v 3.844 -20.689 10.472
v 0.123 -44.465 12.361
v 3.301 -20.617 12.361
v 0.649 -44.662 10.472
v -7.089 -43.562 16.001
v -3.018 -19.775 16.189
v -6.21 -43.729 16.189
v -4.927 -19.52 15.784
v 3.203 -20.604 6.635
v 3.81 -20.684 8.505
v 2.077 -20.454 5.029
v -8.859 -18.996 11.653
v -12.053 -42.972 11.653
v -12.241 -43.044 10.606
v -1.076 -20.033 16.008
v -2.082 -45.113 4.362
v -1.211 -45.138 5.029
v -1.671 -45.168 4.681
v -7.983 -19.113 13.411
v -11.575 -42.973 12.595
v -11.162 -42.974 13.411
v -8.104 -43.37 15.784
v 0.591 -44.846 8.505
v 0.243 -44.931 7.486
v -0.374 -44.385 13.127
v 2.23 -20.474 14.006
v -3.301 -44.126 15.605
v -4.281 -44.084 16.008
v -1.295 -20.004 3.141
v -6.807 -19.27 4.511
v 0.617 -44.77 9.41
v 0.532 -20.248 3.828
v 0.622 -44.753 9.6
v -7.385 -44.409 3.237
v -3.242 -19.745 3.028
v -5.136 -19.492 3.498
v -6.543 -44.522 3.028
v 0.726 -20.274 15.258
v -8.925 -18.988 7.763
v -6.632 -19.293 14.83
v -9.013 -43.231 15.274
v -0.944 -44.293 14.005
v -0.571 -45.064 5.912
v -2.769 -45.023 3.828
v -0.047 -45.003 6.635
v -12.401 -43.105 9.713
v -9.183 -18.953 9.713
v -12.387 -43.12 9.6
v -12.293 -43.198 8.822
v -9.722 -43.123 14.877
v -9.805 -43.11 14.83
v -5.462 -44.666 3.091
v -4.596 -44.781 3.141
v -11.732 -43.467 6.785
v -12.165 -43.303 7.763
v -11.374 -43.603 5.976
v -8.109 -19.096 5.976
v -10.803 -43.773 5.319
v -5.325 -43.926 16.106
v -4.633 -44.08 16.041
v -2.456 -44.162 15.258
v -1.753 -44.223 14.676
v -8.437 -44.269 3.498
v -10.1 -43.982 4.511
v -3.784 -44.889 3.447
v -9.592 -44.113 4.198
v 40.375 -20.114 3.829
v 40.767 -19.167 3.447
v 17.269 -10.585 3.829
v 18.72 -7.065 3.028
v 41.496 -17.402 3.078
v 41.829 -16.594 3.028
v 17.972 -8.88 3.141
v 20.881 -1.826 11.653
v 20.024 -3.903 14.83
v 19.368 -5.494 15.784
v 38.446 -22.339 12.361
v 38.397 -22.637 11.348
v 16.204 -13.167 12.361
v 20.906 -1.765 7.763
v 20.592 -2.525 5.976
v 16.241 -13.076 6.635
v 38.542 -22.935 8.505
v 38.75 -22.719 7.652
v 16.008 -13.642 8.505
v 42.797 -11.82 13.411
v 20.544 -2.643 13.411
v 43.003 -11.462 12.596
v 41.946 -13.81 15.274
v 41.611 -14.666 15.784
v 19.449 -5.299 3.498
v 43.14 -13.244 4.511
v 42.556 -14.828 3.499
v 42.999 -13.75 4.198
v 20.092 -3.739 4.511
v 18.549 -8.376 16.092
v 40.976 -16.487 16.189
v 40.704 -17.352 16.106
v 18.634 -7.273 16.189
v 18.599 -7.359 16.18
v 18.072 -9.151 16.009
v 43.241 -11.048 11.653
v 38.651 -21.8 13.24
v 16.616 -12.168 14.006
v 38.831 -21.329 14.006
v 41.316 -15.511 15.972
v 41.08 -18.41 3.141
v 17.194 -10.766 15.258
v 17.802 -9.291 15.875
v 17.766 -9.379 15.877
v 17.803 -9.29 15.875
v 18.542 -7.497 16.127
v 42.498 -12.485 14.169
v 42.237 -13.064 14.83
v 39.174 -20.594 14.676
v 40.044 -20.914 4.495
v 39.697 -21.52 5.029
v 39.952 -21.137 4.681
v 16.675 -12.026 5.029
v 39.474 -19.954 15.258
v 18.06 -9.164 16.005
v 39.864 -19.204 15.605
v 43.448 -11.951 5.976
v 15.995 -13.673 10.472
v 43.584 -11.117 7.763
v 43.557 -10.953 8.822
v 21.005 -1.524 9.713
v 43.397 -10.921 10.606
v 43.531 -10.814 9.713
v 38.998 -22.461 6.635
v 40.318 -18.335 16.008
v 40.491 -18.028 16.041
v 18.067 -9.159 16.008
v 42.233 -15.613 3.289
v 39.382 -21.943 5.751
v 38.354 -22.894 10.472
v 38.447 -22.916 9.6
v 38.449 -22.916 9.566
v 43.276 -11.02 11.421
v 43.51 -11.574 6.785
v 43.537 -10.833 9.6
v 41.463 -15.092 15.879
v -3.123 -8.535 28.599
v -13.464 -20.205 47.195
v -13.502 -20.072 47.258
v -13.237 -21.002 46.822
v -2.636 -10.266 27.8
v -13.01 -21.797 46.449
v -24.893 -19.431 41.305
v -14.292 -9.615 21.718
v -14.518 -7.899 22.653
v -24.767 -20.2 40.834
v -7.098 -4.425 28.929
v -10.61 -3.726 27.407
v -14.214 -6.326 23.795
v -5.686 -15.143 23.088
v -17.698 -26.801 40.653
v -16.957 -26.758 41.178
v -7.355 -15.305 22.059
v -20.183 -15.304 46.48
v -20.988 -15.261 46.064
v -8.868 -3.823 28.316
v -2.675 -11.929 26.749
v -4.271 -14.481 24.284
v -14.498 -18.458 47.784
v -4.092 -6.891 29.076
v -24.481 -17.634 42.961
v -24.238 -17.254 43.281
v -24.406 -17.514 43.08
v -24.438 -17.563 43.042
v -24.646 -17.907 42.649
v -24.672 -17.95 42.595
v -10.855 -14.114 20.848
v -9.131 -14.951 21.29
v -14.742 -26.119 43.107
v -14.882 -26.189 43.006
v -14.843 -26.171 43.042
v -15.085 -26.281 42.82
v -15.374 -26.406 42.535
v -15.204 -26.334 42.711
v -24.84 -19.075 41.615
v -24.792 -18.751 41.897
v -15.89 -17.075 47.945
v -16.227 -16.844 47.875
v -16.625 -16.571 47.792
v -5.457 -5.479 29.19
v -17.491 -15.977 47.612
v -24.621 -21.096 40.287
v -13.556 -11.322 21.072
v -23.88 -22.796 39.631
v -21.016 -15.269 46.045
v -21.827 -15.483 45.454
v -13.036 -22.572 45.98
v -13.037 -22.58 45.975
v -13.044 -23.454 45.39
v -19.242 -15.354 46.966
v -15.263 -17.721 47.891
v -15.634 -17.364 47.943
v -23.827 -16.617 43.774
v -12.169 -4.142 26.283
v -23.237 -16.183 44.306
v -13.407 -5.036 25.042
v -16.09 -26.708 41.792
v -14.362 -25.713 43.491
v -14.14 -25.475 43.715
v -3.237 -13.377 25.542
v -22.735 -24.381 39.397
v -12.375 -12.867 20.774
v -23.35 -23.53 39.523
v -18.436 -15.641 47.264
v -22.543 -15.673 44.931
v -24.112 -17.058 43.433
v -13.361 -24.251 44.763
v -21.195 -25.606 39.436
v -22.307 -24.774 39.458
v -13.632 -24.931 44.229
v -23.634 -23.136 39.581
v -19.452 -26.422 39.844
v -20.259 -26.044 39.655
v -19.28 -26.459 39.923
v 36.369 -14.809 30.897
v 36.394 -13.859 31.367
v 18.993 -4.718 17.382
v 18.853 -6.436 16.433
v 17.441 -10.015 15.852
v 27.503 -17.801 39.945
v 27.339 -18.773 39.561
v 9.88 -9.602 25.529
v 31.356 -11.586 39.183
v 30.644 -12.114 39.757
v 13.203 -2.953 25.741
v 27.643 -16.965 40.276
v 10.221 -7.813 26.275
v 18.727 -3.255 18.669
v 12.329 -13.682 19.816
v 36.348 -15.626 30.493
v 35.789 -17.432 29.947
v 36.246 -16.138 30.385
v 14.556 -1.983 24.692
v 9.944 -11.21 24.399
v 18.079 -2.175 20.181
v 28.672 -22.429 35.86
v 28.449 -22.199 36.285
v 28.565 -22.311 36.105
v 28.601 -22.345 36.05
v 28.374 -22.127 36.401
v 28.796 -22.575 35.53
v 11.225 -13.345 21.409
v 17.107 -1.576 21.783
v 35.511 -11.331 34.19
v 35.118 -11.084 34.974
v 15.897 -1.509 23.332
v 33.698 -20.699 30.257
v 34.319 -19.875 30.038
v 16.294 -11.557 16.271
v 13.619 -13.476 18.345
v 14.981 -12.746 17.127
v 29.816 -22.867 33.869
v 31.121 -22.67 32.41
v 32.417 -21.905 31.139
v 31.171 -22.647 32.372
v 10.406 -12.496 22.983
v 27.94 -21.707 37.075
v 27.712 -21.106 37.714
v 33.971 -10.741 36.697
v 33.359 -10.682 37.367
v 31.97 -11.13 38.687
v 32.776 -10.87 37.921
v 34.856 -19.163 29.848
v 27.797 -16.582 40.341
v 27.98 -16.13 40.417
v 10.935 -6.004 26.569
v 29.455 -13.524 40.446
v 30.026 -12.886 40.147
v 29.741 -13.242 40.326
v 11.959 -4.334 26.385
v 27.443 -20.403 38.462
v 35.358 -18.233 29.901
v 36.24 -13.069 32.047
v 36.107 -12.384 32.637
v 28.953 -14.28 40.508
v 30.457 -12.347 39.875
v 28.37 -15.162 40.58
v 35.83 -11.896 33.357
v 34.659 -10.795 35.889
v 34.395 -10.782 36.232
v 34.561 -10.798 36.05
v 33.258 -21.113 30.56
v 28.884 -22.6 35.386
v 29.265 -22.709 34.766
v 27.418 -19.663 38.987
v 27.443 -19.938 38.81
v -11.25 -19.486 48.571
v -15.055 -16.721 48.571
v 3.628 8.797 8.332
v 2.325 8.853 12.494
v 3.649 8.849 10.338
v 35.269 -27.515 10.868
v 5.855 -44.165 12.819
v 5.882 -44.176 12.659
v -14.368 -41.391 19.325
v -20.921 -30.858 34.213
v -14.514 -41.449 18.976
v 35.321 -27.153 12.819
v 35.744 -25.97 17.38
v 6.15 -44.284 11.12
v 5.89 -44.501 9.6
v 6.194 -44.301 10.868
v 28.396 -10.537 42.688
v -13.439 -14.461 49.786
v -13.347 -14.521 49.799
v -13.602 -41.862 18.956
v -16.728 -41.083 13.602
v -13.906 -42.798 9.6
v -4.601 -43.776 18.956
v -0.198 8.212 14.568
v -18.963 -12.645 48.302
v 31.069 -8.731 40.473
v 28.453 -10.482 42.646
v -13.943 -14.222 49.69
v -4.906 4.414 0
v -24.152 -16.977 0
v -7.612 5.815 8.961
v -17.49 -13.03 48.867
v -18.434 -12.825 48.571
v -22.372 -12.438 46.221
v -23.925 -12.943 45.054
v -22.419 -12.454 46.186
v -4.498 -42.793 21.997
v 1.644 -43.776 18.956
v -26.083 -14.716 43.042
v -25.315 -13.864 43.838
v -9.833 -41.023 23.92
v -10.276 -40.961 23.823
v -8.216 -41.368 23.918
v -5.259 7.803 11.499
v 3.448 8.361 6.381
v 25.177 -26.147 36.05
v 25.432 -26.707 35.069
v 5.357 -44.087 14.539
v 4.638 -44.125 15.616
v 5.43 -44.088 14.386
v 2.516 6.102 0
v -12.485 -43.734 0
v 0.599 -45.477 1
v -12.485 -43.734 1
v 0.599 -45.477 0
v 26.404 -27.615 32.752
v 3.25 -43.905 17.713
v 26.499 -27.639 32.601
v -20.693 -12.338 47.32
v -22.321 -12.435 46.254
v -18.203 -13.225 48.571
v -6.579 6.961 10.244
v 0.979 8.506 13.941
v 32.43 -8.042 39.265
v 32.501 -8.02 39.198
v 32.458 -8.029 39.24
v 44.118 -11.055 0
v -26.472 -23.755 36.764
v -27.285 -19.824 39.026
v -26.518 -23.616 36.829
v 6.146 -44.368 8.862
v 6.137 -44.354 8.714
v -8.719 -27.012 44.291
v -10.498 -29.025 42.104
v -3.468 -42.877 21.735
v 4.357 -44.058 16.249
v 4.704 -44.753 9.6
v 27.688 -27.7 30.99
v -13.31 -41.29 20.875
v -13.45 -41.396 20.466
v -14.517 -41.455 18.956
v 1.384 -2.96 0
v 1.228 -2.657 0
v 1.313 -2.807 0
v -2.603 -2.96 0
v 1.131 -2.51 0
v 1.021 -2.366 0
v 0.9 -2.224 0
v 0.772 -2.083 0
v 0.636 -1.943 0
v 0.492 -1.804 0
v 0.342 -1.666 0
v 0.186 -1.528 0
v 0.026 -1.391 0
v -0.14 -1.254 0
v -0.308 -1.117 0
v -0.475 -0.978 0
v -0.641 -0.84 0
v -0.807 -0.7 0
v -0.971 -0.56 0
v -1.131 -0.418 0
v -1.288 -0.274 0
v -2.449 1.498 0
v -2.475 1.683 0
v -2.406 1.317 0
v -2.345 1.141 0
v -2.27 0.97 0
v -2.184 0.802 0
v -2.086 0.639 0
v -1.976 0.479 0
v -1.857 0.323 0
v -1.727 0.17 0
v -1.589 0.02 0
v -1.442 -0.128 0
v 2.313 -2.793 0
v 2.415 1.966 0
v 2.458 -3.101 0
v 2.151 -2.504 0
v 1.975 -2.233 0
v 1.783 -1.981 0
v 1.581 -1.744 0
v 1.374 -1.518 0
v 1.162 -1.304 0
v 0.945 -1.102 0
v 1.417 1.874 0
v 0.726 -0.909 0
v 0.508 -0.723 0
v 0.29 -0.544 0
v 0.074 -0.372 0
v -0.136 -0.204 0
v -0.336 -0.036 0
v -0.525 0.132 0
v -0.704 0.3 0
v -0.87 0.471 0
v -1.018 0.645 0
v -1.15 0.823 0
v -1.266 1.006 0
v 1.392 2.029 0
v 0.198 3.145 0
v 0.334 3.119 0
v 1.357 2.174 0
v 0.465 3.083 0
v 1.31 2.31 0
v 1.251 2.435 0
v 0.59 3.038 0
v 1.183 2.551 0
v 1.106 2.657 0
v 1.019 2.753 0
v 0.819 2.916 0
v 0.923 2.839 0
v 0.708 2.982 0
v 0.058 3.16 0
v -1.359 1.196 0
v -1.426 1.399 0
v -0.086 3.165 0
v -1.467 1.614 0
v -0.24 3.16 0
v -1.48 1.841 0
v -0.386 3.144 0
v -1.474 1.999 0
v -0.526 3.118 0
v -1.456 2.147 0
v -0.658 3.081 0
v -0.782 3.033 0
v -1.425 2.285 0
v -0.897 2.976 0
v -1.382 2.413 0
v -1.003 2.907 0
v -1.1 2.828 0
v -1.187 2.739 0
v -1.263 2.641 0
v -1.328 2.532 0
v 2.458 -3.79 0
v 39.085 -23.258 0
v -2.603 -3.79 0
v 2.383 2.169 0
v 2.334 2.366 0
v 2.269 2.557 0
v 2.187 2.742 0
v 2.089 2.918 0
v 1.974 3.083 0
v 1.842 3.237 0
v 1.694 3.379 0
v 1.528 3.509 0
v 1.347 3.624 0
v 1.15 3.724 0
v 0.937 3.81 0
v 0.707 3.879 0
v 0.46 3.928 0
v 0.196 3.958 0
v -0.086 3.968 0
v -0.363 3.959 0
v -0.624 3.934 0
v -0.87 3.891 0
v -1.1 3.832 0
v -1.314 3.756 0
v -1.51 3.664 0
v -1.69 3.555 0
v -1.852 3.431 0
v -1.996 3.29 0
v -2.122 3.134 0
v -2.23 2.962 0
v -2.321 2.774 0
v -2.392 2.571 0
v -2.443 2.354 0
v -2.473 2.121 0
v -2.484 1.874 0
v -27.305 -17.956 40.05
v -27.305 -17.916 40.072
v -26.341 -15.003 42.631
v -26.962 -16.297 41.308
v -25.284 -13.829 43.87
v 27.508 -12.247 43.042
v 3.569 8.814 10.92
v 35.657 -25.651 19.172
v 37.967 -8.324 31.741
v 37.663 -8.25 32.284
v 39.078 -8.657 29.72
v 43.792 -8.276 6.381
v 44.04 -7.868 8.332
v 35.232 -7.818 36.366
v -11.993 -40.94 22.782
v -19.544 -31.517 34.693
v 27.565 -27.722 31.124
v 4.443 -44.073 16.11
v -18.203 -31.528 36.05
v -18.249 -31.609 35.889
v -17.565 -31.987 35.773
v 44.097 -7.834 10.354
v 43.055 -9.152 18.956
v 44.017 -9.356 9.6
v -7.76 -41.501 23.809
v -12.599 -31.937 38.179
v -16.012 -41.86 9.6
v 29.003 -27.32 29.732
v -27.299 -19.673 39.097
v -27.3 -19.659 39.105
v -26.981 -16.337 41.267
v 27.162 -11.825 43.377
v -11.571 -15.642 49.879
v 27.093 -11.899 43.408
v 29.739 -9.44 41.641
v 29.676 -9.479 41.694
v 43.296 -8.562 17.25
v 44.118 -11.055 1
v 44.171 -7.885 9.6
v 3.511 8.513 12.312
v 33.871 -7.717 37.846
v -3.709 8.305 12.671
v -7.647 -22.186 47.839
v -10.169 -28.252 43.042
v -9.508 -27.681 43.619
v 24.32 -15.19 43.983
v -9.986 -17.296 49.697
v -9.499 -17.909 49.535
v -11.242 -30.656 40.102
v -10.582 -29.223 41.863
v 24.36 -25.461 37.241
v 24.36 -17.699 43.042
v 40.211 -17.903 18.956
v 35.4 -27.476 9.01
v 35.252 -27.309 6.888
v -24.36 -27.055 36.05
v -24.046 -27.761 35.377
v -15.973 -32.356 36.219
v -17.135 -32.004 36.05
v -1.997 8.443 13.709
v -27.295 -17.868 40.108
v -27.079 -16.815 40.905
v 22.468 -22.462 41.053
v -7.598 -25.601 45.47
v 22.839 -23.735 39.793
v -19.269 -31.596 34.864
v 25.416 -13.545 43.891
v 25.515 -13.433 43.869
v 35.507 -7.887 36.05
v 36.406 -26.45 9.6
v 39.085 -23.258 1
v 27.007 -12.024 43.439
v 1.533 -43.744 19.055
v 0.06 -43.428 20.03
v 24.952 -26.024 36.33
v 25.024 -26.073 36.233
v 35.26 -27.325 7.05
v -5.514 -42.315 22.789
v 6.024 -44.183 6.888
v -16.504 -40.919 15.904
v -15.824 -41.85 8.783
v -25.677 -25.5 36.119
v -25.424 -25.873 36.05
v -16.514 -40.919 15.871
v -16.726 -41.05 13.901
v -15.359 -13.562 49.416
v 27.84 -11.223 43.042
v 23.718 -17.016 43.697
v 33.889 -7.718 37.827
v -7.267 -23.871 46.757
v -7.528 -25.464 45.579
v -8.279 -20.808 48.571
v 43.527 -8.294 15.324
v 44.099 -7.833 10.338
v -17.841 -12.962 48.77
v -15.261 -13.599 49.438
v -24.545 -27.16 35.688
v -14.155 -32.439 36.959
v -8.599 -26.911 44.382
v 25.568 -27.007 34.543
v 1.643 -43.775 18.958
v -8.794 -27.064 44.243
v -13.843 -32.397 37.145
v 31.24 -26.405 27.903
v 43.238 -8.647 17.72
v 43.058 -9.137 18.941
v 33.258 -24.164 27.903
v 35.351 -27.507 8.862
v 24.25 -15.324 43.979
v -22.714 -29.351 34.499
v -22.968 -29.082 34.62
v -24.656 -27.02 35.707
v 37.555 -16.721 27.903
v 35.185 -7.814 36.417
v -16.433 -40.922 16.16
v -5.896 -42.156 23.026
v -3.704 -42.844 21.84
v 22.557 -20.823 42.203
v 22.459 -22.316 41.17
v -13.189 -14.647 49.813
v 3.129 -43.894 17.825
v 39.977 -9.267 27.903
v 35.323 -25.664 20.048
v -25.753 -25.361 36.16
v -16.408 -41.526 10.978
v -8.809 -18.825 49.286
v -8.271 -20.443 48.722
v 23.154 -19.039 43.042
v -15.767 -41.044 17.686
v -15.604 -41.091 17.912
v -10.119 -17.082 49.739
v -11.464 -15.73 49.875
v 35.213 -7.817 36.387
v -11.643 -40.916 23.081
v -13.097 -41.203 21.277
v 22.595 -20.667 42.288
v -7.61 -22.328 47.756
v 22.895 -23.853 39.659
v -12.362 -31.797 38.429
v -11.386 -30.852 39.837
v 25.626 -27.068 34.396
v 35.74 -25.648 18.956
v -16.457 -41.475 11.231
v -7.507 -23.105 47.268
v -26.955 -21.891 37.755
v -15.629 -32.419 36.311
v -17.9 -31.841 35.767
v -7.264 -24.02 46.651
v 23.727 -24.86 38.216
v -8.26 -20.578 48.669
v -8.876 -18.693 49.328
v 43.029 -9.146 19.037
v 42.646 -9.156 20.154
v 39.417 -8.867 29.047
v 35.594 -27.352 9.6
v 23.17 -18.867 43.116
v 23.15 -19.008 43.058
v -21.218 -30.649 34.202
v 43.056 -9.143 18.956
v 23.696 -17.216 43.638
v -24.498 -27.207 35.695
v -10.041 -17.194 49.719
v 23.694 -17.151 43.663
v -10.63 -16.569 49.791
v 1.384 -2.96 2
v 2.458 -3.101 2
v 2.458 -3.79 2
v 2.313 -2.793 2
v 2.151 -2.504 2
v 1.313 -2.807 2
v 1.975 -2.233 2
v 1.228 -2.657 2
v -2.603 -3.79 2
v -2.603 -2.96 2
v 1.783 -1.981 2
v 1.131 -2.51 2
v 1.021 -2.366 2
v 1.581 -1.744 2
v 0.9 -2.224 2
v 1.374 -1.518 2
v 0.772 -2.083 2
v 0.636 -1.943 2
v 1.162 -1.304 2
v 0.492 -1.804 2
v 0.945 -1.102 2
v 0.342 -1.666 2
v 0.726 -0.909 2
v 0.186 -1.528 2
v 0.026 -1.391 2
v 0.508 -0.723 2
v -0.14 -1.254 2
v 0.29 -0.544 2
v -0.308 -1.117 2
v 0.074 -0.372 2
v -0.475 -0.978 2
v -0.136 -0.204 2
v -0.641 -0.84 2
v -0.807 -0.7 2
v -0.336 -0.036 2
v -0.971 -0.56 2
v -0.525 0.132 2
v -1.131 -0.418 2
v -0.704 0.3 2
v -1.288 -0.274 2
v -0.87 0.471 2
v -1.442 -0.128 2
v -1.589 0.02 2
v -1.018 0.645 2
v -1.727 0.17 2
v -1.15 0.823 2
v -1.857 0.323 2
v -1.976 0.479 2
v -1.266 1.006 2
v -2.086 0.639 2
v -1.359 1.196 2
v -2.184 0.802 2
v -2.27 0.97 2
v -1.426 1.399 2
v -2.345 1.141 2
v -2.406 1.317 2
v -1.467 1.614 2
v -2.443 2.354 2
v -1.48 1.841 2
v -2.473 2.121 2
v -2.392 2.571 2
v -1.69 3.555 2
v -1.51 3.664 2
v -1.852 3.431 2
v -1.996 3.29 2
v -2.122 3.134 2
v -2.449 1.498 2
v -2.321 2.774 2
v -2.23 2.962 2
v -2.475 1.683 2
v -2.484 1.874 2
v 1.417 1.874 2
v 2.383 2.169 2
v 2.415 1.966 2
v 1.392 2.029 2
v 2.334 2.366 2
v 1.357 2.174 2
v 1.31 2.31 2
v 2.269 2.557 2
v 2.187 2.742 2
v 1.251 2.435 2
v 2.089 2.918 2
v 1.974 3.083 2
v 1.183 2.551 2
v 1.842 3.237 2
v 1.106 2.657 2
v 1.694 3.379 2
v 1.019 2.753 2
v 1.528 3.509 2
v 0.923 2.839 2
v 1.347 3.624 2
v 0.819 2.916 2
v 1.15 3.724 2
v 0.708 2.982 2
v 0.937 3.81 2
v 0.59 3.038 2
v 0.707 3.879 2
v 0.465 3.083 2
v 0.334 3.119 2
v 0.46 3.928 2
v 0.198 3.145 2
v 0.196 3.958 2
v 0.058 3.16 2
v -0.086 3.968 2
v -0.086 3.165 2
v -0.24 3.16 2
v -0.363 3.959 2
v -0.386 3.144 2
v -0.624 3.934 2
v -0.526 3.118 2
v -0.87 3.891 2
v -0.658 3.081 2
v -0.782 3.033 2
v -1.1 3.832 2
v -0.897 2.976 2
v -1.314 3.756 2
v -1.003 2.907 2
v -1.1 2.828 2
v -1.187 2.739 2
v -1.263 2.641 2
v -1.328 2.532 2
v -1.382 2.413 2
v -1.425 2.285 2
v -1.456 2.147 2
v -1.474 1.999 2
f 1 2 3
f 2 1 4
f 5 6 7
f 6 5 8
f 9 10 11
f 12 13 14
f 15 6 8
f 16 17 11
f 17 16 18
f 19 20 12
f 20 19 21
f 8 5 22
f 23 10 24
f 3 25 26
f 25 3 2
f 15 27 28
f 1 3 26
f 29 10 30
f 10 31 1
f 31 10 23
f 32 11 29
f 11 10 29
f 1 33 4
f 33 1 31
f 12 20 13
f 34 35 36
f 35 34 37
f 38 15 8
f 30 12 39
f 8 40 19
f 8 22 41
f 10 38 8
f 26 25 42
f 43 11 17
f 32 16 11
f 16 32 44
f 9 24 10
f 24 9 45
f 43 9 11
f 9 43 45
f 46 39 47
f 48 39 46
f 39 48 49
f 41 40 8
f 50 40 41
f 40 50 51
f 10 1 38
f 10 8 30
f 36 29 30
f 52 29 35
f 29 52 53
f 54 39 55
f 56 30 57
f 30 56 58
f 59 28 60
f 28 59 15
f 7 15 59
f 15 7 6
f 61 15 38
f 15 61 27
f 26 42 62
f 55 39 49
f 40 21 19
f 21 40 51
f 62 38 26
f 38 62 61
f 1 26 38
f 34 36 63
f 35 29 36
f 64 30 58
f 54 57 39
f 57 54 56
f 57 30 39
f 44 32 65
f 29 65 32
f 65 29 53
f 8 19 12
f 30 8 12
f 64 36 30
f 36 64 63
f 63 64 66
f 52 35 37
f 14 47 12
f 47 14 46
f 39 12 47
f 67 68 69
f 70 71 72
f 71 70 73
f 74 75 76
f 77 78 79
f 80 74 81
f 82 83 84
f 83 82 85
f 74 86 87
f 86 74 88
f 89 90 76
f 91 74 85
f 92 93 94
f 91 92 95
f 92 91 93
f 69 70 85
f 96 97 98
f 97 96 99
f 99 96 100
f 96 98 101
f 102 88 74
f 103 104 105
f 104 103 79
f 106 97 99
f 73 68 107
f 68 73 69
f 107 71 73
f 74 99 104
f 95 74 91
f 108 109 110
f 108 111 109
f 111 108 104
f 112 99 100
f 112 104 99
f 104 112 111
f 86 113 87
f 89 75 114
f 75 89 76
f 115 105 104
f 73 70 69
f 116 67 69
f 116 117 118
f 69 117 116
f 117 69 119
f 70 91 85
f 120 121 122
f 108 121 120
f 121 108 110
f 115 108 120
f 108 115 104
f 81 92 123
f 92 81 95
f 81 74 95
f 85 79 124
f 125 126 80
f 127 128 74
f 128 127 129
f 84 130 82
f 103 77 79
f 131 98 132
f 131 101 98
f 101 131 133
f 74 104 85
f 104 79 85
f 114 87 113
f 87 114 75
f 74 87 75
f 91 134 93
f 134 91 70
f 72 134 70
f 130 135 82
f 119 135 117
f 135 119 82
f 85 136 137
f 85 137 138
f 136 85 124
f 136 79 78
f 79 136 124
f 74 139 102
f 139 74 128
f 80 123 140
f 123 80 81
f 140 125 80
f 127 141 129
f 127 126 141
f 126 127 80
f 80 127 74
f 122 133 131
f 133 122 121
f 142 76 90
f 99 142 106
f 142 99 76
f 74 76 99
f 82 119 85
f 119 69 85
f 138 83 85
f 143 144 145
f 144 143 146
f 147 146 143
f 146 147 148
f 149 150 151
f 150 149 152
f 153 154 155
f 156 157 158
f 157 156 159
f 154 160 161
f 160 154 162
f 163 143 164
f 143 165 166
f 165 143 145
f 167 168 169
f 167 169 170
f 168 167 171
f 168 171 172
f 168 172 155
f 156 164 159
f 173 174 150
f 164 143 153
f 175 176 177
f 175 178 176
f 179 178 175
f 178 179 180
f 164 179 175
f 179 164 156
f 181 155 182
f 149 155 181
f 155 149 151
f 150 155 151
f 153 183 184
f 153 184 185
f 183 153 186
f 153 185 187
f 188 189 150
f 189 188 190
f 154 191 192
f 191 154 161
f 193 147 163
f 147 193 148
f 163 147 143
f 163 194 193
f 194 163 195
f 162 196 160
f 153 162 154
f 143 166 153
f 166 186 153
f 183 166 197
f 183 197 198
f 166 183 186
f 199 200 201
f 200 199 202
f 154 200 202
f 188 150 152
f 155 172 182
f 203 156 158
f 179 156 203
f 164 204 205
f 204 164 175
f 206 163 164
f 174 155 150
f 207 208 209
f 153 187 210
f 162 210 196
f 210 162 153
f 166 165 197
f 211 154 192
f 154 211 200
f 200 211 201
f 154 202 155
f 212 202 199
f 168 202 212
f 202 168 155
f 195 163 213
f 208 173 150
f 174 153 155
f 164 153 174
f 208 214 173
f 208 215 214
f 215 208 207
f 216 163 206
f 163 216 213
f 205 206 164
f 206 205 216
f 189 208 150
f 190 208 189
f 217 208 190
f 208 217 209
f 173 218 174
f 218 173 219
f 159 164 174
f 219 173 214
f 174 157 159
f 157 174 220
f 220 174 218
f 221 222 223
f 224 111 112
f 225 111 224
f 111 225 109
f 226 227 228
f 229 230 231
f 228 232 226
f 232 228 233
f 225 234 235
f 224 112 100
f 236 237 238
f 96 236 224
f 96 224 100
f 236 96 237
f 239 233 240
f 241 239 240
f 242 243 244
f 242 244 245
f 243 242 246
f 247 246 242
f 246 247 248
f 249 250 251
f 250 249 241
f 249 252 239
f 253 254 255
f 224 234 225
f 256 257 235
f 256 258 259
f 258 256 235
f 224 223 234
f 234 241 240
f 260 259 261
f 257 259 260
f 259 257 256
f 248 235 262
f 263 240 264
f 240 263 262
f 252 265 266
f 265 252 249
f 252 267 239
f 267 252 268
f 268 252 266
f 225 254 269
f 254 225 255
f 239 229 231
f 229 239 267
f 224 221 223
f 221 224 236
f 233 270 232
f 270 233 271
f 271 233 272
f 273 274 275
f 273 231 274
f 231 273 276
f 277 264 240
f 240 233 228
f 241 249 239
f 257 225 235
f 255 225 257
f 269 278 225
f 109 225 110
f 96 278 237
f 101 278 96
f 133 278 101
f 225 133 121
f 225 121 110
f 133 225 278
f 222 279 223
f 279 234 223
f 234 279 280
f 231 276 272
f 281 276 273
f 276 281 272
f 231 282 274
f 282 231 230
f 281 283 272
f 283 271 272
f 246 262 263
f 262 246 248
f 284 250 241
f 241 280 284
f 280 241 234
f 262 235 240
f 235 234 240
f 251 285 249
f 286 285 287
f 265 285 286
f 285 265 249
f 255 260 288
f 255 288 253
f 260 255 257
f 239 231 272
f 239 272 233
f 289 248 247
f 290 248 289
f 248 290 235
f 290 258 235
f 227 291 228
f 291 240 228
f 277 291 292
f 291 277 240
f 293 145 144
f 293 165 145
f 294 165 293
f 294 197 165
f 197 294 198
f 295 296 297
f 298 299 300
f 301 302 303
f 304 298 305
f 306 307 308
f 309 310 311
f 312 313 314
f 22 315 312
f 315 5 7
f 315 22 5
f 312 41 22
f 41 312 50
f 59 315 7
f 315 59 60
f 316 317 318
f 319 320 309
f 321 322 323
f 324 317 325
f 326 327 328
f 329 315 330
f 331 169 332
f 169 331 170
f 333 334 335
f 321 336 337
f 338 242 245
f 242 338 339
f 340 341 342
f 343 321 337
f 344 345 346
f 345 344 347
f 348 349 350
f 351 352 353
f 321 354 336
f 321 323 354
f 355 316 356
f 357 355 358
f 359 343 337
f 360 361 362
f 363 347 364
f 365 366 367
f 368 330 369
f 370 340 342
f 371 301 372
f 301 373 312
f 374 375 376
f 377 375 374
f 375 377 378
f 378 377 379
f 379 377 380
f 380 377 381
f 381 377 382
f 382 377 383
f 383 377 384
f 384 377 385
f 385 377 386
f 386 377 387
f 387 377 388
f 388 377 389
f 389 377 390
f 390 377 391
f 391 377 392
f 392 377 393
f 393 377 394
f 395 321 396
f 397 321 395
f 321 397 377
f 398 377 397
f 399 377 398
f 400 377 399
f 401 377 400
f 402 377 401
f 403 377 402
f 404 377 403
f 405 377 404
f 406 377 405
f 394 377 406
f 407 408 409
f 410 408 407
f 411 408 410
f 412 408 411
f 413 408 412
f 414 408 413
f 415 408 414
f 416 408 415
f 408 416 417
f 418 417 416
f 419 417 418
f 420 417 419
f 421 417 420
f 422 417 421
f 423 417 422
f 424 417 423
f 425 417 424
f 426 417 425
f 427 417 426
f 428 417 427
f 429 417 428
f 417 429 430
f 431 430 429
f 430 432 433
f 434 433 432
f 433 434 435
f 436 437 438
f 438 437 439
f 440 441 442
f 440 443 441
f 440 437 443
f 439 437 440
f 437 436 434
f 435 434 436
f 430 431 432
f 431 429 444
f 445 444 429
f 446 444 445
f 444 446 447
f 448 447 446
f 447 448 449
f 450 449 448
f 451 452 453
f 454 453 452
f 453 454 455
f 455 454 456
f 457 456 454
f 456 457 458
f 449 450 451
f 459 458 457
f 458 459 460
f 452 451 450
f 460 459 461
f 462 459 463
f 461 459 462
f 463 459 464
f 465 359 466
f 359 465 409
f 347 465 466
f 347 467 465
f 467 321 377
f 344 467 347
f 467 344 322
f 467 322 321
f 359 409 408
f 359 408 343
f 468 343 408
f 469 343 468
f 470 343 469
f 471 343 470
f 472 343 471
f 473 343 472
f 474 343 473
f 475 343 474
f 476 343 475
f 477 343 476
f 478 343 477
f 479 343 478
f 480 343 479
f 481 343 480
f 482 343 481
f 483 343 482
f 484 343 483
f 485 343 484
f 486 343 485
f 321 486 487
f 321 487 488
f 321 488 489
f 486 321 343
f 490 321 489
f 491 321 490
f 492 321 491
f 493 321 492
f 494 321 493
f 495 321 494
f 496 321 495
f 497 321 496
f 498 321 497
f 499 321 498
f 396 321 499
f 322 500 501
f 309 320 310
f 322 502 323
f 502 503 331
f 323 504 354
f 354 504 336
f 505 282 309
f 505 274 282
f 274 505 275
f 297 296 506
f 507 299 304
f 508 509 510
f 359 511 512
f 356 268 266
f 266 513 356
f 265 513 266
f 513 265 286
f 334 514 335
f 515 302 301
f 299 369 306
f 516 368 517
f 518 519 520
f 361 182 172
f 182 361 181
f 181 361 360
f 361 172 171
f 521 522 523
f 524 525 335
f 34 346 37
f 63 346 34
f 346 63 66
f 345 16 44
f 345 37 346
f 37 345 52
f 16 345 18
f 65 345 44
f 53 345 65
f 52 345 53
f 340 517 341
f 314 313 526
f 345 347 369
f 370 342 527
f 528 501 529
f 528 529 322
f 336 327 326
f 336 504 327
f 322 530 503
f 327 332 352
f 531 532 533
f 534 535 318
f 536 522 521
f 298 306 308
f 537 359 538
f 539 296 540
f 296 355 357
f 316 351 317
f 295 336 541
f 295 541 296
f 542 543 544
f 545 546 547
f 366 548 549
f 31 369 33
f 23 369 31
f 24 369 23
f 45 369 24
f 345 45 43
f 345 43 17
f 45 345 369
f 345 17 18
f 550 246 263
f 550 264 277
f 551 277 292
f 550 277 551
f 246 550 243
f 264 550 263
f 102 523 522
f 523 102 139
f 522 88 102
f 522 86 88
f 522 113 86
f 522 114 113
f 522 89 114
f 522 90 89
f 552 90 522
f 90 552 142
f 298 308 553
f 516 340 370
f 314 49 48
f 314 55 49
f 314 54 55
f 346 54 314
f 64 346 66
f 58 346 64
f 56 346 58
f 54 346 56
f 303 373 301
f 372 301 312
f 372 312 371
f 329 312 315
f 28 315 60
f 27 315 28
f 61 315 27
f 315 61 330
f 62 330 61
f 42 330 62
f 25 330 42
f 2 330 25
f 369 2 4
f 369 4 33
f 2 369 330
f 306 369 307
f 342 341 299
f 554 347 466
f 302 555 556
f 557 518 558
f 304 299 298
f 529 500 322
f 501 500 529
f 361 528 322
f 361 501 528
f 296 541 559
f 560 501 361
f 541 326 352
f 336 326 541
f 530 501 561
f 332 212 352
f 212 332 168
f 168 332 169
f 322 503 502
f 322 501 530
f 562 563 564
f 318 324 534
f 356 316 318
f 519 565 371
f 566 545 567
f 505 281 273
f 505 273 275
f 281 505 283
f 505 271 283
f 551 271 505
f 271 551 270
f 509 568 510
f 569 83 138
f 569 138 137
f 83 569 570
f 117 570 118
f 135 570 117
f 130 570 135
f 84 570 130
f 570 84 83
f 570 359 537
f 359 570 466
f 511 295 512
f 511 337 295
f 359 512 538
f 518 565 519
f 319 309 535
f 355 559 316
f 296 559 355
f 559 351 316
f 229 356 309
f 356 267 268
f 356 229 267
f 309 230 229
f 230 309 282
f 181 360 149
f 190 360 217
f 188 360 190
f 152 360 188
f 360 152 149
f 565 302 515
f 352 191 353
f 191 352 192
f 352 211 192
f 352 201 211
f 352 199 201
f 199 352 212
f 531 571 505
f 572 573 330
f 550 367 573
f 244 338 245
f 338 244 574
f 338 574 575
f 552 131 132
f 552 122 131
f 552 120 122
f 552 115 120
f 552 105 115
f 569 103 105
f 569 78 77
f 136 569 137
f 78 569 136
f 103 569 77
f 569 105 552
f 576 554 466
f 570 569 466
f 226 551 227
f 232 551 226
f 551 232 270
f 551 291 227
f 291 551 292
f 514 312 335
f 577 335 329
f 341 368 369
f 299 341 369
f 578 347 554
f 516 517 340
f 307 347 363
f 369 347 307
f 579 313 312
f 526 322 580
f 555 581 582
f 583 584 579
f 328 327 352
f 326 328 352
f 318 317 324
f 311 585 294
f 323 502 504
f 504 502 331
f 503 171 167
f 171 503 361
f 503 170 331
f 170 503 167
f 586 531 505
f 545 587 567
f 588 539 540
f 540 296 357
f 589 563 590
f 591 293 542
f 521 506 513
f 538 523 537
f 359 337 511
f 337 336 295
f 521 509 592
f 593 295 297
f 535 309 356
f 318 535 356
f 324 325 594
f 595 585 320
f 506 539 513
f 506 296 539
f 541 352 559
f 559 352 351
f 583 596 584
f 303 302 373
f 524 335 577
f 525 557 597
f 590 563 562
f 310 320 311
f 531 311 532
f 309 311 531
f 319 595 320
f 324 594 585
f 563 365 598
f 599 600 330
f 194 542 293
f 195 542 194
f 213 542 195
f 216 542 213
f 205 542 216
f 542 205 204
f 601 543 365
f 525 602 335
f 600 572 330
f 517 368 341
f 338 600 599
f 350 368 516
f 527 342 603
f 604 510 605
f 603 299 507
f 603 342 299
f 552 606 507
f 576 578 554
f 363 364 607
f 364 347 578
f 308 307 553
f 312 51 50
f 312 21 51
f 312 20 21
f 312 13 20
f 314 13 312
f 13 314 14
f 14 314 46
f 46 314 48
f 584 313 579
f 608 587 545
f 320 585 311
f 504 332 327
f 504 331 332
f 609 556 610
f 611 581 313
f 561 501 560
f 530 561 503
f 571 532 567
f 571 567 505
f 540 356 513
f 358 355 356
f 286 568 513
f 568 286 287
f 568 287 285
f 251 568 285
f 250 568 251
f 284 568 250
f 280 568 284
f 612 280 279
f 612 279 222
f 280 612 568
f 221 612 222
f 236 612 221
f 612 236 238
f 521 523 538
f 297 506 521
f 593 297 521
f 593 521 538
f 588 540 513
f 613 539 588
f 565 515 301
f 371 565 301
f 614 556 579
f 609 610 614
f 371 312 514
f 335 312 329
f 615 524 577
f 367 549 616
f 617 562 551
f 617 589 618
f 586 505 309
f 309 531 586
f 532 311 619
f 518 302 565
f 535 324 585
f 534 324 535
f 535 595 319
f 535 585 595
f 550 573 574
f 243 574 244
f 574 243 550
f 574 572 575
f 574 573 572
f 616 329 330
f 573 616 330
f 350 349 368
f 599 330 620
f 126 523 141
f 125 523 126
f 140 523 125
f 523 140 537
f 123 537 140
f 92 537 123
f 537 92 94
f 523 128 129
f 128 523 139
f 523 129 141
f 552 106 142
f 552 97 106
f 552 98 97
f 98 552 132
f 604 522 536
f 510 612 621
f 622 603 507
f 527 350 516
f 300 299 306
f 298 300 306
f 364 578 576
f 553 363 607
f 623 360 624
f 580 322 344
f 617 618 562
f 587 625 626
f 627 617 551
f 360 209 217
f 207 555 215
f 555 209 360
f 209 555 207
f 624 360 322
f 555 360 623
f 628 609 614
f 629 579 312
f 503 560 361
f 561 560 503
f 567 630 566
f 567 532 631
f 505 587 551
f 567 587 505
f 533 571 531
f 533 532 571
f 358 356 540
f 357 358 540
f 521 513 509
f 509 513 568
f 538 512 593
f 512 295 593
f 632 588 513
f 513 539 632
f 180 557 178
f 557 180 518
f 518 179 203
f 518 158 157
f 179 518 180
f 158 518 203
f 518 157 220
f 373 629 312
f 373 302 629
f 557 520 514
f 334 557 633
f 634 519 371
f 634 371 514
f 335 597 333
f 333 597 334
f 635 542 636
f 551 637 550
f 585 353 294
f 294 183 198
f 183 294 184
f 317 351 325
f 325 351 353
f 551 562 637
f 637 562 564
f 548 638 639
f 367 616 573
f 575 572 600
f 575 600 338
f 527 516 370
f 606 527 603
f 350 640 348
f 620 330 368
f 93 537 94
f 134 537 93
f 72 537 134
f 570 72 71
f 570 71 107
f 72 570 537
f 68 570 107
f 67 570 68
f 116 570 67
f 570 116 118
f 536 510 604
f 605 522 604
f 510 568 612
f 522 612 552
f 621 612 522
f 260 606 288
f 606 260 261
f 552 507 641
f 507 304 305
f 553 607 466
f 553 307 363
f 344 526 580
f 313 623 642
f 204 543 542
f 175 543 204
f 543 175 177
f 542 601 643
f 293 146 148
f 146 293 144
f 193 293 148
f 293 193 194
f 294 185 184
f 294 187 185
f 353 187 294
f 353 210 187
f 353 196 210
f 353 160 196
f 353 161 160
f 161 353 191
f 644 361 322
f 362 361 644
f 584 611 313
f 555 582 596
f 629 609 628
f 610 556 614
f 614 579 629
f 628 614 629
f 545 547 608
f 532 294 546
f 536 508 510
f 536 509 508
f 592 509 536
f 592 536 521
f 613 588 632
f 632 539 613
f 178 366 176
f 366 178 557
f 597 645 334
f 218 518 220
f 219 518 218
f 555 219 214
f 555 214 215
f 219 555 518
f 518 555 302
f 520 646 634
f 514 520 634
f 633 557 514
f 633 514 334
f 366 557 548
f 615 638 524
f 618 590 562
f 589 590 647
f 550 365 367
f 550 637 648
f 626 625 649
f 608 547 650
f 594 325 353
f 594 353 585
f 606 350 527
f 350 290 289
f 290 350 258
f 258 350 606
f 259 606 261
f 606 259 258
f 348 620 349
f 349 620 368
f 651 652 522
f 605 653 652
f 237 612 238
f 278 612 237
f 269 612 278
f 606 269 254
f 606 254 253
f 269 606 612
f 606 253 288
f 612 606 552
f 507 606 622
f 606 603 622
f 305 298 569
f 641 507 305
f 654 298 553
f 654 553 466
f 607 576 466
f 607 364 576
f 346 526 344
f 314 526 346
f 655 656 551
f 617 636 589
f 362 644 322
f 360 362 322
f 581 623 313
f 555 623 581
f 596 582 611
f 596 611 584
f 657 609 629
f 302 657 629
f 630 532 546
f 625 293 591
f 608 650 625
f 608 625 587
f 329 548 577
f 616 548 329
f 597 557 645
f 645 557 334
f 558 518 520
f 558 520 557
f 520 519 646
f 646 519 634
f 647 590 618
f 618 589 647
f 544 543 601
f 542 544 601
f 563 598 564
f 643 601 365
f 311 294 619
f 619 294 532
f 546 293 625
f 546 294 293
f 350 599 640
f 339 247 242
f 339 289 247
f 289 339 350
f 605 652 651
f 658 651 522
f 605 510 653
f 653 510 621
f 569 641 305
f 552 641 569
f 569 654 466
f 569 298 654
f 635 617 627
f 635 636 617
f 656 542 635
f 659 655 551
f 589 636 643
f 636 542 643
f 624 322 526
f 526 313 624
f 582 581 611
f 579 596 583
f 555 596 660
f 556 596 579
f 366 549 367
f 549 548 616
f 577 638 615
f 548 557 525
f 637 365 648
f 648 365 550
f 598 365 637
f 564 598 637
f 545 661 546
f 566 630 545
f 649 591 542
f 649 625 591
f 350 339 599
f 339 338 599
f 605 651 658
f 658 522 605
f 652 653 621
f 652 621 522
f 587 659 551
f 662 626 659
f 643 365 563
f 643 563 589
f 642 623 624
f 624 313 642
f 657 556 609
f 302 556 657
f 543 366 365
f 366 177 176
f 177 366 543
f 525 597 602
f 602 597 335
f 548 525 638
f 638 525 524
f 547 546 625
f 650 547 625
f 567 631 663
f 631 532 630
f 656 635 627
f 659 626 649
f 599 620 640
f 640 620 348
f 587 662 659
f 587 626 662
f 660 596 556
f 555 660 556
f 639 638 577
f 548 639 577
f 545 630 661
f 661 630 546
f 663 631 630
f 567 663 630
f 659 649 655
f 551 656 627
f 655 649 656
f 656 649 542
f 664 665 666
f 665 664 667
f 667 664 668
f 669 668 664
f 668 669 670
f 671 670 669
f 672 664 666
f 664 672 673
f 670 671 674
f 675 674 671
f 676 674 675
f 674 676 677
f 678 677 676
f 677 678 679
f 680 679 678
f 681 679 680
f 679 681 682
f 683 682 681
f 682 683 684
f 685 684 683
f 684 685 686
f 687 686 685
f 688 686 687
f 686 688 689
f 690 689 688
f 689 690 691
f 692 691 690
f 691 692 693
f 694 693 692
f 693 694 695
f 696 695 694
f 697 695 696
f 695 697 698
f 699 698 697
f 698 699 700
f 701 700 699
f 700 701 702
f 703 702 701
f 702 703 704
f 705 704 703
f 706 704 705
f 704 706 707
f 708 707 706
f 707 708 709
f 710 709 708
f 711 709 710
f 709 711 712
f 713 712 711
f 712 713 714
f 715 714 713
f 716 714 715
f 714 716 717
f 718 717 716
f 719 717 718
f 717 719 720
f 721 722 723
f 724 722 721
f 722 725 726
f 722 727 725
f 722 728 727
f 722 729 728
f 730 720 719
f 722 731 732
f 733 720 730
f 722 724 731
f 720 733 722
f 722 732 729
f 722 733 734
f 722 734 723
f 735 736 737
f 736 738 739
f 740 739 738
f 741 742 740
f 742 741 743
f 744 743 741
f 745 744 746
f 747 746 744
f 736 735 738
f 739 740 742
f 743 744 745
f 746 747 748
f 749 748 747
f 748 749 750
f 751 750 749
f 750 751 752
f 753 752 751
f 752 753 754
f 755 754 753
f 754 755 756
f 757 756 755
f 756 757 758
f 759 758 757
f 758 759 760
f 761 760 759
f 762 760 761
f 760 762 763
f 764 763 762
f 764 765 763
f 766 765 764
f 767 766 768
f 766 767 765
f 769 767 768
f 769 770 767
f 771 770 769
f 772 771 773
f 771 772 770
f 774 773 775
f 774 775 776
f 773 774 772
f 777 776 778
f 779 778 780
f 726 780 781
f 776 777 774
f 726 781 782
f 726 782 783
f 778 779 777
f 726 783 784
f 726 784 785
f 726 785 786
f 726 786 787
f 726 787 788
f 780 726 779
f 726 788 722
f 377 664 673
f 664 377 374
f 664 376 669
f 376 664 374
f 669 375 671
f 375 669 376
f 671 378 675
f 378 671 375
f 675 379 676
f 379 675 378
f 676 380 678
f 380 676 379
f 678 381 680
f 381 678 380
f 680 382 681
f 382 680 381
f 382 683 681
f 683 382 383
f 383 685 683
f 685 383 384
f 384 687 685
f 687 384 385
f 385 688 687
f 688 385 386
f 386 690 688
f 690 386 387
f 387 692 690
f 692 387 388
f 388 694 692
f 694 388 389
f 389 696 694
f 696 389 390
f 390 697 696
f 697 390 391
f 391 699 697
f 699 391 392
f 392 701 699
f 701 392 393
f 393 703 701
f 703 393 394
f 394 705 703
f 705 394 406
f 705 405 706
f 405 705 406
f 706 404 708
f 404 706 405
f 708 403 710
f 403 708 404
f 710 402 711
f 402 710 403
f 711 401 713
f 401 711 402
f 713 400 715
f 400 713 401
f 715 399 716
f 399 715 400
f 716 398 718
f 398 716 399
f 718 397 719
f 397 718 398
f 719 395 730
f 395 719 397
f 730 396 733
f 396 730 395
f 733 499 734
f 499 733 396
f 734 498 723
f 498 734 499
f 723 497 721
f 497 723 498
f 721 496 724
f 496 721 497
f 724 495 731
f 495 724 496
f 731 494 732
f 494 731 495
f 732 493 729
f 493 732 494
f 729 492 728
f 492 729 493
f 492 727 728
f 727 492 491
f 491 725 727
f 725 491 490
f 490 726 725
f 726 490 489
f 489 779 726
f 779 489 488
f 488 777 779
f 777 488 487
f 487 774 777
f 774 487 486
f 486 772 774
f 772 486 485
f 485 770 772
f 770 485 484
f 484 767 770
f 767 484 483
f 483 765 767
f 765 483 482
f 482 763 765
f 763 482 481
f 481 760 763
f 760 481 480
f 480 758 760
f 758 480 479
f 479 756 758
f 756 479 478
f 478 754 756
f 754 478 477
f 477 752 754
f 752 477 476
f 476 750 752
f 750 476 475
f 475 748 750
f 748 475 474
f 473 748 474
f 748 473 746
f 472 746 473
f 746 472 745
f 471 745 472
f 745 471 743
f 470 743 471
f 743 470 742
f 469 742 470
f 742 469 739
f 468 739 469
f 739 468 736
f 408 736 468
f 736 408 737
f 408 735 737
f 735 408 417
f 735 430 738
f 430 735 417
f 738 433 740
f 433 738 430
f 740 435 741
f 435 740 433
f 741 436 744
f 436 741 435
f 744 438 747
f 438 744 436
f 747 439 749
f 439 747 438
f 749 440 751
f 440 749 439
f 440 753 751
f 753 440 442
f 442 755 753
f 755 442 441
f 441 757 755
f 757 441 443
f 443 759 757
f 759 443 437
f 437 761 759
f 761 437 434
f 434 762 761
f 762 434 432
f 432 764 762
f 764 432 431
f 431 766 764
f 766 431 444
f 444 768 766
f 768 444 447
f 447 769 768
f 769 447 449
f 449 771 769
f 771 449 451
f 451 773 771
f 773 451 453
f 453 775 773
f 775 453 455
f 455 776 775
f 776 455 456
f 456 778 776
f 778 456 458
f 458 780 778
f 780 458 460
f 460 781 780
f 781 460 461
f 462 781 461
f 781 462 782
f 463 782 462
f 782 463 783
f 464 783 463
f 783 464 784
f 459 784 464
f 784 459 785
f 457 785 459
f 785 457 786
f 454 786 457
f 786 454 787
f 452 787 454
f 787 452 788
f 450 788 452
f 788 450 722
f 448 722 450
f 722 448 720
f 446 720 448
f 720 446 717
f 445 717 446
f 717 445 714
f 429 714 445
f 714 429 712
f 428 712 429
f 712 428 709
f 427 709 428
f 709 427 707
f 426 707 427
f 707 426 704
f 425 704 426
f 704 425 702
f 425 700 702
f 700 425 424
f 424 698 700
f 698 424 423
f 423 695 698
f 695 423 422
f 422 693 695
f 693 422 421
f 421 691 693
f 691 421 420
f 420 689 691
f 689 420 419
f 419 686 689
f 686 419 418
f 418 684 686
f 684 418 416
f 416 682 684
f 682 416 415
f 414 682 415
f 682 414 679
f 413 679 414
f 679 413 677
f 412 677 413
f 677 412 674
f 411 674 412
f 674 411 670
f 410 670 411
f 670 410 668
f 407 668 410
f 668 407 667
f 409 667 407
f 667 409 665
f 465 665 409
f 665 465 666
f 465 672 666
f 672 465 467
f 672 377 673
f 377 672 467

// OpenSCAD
difference() {
	difference() {
		difference() {
			hull() {
				union() {
					union() {
						rotate(a = -97.5890894690, v = [0, 0, 1]) {
							translate(v = [0, -6.6000000000, 0]) {
								cube(size = [45.0000000000, 13.2000000000, 1]);
							}
						}
						rotate(a = -22.4109105310, v = [0, 0, 1]) {
							translate(v = [0, -6.6000000000, 0]) {
								cube(size = [45.0000000000, 13.2000000000, 1]);
							}
						}
						rotate(a = -131.9774986721, v = [0, 0, 1]) {
							translate(v = [0, -6.6000000000, 0]) {
								cube(size = [28.7746467178, 13.2000000000, 1]);
							}
						}
						rotate(a = -27.7117740210, v = [0, 0, 1]) {
							translate(v = [0, -6.6000000000, 0]) {
								cube(size = [36.6667045551, 13.2000000000, 1]);
							}
						}
					}
					translate(v = [0, 0, 9.6000050529]) {
						intersection() {
							hull() {
								rotate(a = 90.0000707943, v = [0.9912407072, -0.1320676359, -0.0000008592]) {
									cylinder(h = 45, r = 9.6000000000);
								}
								rotate(a = 89.9999657642, v = [0.3812464258, 0.9244734516, -0.0000013057]) {
									cylinder(h = 45, r = 9.6000000000);
								}
								rotate(a = 39.7499014477, v = [0.4753627608, -0.4276807123, -0.0000000477]) {
									cylinder(h = 45, r = 9.6000000000);
								}
								rotate(a = 54.5691144470, v = [0.3789093996, 0.7213541602, -0.0000011003]) {
									cylinder(h = 45, r = 9.6000000000);
								}
							}
							sphere(r = 45);
						}
					}
				}
			}
			translate(v = [0, 0, 9.6000050529]) {
				rotate(a = 90.0000707943, v = [0.9912407072, -0.1320676359, -0.0000008592]) {
					translate(v = [0, 0, 20]) {
						cylinder(h = 45, r = 6.6000000000);
					}
				}
				rotate(a = 89.9999657642, v = [0.3812464258, 0.9244734516, -0.0000013057]) {
					translate(v = [0, 0, 20]) {
						cylinder(h = 45, r = 6.6000000000);
					}
				}
				rotate(a = 39.7499014477, v = [0.4753627608, -0.4276807123, -0.0000000477]) {
					translate(v = [0, 0, 20]) {
						cylinder(h = 45, r = 6.6000000000);
					}
				}
				rotate(a = 54.5691144470, v = [0.3789093996, 0.7213541602, -0.0000011003]) {
					translate(v = [0, 0, 20]) {
						cylinder(h = 45, r = 6.6000000000);
					}
				}
			}
		}
		translate(v = [-100, -100, -100]) {
			cube(size = [200, 200, 100]);
		}
	}
	translate(v = [0, 0, 2]) {
		rotate(a = 180, v = [0, 1, 0]) {
			linear_extrude(height = 3) {
				text(halign = "center", size = 8, text = "2", valign = "center");
			}
		}
	}
}
